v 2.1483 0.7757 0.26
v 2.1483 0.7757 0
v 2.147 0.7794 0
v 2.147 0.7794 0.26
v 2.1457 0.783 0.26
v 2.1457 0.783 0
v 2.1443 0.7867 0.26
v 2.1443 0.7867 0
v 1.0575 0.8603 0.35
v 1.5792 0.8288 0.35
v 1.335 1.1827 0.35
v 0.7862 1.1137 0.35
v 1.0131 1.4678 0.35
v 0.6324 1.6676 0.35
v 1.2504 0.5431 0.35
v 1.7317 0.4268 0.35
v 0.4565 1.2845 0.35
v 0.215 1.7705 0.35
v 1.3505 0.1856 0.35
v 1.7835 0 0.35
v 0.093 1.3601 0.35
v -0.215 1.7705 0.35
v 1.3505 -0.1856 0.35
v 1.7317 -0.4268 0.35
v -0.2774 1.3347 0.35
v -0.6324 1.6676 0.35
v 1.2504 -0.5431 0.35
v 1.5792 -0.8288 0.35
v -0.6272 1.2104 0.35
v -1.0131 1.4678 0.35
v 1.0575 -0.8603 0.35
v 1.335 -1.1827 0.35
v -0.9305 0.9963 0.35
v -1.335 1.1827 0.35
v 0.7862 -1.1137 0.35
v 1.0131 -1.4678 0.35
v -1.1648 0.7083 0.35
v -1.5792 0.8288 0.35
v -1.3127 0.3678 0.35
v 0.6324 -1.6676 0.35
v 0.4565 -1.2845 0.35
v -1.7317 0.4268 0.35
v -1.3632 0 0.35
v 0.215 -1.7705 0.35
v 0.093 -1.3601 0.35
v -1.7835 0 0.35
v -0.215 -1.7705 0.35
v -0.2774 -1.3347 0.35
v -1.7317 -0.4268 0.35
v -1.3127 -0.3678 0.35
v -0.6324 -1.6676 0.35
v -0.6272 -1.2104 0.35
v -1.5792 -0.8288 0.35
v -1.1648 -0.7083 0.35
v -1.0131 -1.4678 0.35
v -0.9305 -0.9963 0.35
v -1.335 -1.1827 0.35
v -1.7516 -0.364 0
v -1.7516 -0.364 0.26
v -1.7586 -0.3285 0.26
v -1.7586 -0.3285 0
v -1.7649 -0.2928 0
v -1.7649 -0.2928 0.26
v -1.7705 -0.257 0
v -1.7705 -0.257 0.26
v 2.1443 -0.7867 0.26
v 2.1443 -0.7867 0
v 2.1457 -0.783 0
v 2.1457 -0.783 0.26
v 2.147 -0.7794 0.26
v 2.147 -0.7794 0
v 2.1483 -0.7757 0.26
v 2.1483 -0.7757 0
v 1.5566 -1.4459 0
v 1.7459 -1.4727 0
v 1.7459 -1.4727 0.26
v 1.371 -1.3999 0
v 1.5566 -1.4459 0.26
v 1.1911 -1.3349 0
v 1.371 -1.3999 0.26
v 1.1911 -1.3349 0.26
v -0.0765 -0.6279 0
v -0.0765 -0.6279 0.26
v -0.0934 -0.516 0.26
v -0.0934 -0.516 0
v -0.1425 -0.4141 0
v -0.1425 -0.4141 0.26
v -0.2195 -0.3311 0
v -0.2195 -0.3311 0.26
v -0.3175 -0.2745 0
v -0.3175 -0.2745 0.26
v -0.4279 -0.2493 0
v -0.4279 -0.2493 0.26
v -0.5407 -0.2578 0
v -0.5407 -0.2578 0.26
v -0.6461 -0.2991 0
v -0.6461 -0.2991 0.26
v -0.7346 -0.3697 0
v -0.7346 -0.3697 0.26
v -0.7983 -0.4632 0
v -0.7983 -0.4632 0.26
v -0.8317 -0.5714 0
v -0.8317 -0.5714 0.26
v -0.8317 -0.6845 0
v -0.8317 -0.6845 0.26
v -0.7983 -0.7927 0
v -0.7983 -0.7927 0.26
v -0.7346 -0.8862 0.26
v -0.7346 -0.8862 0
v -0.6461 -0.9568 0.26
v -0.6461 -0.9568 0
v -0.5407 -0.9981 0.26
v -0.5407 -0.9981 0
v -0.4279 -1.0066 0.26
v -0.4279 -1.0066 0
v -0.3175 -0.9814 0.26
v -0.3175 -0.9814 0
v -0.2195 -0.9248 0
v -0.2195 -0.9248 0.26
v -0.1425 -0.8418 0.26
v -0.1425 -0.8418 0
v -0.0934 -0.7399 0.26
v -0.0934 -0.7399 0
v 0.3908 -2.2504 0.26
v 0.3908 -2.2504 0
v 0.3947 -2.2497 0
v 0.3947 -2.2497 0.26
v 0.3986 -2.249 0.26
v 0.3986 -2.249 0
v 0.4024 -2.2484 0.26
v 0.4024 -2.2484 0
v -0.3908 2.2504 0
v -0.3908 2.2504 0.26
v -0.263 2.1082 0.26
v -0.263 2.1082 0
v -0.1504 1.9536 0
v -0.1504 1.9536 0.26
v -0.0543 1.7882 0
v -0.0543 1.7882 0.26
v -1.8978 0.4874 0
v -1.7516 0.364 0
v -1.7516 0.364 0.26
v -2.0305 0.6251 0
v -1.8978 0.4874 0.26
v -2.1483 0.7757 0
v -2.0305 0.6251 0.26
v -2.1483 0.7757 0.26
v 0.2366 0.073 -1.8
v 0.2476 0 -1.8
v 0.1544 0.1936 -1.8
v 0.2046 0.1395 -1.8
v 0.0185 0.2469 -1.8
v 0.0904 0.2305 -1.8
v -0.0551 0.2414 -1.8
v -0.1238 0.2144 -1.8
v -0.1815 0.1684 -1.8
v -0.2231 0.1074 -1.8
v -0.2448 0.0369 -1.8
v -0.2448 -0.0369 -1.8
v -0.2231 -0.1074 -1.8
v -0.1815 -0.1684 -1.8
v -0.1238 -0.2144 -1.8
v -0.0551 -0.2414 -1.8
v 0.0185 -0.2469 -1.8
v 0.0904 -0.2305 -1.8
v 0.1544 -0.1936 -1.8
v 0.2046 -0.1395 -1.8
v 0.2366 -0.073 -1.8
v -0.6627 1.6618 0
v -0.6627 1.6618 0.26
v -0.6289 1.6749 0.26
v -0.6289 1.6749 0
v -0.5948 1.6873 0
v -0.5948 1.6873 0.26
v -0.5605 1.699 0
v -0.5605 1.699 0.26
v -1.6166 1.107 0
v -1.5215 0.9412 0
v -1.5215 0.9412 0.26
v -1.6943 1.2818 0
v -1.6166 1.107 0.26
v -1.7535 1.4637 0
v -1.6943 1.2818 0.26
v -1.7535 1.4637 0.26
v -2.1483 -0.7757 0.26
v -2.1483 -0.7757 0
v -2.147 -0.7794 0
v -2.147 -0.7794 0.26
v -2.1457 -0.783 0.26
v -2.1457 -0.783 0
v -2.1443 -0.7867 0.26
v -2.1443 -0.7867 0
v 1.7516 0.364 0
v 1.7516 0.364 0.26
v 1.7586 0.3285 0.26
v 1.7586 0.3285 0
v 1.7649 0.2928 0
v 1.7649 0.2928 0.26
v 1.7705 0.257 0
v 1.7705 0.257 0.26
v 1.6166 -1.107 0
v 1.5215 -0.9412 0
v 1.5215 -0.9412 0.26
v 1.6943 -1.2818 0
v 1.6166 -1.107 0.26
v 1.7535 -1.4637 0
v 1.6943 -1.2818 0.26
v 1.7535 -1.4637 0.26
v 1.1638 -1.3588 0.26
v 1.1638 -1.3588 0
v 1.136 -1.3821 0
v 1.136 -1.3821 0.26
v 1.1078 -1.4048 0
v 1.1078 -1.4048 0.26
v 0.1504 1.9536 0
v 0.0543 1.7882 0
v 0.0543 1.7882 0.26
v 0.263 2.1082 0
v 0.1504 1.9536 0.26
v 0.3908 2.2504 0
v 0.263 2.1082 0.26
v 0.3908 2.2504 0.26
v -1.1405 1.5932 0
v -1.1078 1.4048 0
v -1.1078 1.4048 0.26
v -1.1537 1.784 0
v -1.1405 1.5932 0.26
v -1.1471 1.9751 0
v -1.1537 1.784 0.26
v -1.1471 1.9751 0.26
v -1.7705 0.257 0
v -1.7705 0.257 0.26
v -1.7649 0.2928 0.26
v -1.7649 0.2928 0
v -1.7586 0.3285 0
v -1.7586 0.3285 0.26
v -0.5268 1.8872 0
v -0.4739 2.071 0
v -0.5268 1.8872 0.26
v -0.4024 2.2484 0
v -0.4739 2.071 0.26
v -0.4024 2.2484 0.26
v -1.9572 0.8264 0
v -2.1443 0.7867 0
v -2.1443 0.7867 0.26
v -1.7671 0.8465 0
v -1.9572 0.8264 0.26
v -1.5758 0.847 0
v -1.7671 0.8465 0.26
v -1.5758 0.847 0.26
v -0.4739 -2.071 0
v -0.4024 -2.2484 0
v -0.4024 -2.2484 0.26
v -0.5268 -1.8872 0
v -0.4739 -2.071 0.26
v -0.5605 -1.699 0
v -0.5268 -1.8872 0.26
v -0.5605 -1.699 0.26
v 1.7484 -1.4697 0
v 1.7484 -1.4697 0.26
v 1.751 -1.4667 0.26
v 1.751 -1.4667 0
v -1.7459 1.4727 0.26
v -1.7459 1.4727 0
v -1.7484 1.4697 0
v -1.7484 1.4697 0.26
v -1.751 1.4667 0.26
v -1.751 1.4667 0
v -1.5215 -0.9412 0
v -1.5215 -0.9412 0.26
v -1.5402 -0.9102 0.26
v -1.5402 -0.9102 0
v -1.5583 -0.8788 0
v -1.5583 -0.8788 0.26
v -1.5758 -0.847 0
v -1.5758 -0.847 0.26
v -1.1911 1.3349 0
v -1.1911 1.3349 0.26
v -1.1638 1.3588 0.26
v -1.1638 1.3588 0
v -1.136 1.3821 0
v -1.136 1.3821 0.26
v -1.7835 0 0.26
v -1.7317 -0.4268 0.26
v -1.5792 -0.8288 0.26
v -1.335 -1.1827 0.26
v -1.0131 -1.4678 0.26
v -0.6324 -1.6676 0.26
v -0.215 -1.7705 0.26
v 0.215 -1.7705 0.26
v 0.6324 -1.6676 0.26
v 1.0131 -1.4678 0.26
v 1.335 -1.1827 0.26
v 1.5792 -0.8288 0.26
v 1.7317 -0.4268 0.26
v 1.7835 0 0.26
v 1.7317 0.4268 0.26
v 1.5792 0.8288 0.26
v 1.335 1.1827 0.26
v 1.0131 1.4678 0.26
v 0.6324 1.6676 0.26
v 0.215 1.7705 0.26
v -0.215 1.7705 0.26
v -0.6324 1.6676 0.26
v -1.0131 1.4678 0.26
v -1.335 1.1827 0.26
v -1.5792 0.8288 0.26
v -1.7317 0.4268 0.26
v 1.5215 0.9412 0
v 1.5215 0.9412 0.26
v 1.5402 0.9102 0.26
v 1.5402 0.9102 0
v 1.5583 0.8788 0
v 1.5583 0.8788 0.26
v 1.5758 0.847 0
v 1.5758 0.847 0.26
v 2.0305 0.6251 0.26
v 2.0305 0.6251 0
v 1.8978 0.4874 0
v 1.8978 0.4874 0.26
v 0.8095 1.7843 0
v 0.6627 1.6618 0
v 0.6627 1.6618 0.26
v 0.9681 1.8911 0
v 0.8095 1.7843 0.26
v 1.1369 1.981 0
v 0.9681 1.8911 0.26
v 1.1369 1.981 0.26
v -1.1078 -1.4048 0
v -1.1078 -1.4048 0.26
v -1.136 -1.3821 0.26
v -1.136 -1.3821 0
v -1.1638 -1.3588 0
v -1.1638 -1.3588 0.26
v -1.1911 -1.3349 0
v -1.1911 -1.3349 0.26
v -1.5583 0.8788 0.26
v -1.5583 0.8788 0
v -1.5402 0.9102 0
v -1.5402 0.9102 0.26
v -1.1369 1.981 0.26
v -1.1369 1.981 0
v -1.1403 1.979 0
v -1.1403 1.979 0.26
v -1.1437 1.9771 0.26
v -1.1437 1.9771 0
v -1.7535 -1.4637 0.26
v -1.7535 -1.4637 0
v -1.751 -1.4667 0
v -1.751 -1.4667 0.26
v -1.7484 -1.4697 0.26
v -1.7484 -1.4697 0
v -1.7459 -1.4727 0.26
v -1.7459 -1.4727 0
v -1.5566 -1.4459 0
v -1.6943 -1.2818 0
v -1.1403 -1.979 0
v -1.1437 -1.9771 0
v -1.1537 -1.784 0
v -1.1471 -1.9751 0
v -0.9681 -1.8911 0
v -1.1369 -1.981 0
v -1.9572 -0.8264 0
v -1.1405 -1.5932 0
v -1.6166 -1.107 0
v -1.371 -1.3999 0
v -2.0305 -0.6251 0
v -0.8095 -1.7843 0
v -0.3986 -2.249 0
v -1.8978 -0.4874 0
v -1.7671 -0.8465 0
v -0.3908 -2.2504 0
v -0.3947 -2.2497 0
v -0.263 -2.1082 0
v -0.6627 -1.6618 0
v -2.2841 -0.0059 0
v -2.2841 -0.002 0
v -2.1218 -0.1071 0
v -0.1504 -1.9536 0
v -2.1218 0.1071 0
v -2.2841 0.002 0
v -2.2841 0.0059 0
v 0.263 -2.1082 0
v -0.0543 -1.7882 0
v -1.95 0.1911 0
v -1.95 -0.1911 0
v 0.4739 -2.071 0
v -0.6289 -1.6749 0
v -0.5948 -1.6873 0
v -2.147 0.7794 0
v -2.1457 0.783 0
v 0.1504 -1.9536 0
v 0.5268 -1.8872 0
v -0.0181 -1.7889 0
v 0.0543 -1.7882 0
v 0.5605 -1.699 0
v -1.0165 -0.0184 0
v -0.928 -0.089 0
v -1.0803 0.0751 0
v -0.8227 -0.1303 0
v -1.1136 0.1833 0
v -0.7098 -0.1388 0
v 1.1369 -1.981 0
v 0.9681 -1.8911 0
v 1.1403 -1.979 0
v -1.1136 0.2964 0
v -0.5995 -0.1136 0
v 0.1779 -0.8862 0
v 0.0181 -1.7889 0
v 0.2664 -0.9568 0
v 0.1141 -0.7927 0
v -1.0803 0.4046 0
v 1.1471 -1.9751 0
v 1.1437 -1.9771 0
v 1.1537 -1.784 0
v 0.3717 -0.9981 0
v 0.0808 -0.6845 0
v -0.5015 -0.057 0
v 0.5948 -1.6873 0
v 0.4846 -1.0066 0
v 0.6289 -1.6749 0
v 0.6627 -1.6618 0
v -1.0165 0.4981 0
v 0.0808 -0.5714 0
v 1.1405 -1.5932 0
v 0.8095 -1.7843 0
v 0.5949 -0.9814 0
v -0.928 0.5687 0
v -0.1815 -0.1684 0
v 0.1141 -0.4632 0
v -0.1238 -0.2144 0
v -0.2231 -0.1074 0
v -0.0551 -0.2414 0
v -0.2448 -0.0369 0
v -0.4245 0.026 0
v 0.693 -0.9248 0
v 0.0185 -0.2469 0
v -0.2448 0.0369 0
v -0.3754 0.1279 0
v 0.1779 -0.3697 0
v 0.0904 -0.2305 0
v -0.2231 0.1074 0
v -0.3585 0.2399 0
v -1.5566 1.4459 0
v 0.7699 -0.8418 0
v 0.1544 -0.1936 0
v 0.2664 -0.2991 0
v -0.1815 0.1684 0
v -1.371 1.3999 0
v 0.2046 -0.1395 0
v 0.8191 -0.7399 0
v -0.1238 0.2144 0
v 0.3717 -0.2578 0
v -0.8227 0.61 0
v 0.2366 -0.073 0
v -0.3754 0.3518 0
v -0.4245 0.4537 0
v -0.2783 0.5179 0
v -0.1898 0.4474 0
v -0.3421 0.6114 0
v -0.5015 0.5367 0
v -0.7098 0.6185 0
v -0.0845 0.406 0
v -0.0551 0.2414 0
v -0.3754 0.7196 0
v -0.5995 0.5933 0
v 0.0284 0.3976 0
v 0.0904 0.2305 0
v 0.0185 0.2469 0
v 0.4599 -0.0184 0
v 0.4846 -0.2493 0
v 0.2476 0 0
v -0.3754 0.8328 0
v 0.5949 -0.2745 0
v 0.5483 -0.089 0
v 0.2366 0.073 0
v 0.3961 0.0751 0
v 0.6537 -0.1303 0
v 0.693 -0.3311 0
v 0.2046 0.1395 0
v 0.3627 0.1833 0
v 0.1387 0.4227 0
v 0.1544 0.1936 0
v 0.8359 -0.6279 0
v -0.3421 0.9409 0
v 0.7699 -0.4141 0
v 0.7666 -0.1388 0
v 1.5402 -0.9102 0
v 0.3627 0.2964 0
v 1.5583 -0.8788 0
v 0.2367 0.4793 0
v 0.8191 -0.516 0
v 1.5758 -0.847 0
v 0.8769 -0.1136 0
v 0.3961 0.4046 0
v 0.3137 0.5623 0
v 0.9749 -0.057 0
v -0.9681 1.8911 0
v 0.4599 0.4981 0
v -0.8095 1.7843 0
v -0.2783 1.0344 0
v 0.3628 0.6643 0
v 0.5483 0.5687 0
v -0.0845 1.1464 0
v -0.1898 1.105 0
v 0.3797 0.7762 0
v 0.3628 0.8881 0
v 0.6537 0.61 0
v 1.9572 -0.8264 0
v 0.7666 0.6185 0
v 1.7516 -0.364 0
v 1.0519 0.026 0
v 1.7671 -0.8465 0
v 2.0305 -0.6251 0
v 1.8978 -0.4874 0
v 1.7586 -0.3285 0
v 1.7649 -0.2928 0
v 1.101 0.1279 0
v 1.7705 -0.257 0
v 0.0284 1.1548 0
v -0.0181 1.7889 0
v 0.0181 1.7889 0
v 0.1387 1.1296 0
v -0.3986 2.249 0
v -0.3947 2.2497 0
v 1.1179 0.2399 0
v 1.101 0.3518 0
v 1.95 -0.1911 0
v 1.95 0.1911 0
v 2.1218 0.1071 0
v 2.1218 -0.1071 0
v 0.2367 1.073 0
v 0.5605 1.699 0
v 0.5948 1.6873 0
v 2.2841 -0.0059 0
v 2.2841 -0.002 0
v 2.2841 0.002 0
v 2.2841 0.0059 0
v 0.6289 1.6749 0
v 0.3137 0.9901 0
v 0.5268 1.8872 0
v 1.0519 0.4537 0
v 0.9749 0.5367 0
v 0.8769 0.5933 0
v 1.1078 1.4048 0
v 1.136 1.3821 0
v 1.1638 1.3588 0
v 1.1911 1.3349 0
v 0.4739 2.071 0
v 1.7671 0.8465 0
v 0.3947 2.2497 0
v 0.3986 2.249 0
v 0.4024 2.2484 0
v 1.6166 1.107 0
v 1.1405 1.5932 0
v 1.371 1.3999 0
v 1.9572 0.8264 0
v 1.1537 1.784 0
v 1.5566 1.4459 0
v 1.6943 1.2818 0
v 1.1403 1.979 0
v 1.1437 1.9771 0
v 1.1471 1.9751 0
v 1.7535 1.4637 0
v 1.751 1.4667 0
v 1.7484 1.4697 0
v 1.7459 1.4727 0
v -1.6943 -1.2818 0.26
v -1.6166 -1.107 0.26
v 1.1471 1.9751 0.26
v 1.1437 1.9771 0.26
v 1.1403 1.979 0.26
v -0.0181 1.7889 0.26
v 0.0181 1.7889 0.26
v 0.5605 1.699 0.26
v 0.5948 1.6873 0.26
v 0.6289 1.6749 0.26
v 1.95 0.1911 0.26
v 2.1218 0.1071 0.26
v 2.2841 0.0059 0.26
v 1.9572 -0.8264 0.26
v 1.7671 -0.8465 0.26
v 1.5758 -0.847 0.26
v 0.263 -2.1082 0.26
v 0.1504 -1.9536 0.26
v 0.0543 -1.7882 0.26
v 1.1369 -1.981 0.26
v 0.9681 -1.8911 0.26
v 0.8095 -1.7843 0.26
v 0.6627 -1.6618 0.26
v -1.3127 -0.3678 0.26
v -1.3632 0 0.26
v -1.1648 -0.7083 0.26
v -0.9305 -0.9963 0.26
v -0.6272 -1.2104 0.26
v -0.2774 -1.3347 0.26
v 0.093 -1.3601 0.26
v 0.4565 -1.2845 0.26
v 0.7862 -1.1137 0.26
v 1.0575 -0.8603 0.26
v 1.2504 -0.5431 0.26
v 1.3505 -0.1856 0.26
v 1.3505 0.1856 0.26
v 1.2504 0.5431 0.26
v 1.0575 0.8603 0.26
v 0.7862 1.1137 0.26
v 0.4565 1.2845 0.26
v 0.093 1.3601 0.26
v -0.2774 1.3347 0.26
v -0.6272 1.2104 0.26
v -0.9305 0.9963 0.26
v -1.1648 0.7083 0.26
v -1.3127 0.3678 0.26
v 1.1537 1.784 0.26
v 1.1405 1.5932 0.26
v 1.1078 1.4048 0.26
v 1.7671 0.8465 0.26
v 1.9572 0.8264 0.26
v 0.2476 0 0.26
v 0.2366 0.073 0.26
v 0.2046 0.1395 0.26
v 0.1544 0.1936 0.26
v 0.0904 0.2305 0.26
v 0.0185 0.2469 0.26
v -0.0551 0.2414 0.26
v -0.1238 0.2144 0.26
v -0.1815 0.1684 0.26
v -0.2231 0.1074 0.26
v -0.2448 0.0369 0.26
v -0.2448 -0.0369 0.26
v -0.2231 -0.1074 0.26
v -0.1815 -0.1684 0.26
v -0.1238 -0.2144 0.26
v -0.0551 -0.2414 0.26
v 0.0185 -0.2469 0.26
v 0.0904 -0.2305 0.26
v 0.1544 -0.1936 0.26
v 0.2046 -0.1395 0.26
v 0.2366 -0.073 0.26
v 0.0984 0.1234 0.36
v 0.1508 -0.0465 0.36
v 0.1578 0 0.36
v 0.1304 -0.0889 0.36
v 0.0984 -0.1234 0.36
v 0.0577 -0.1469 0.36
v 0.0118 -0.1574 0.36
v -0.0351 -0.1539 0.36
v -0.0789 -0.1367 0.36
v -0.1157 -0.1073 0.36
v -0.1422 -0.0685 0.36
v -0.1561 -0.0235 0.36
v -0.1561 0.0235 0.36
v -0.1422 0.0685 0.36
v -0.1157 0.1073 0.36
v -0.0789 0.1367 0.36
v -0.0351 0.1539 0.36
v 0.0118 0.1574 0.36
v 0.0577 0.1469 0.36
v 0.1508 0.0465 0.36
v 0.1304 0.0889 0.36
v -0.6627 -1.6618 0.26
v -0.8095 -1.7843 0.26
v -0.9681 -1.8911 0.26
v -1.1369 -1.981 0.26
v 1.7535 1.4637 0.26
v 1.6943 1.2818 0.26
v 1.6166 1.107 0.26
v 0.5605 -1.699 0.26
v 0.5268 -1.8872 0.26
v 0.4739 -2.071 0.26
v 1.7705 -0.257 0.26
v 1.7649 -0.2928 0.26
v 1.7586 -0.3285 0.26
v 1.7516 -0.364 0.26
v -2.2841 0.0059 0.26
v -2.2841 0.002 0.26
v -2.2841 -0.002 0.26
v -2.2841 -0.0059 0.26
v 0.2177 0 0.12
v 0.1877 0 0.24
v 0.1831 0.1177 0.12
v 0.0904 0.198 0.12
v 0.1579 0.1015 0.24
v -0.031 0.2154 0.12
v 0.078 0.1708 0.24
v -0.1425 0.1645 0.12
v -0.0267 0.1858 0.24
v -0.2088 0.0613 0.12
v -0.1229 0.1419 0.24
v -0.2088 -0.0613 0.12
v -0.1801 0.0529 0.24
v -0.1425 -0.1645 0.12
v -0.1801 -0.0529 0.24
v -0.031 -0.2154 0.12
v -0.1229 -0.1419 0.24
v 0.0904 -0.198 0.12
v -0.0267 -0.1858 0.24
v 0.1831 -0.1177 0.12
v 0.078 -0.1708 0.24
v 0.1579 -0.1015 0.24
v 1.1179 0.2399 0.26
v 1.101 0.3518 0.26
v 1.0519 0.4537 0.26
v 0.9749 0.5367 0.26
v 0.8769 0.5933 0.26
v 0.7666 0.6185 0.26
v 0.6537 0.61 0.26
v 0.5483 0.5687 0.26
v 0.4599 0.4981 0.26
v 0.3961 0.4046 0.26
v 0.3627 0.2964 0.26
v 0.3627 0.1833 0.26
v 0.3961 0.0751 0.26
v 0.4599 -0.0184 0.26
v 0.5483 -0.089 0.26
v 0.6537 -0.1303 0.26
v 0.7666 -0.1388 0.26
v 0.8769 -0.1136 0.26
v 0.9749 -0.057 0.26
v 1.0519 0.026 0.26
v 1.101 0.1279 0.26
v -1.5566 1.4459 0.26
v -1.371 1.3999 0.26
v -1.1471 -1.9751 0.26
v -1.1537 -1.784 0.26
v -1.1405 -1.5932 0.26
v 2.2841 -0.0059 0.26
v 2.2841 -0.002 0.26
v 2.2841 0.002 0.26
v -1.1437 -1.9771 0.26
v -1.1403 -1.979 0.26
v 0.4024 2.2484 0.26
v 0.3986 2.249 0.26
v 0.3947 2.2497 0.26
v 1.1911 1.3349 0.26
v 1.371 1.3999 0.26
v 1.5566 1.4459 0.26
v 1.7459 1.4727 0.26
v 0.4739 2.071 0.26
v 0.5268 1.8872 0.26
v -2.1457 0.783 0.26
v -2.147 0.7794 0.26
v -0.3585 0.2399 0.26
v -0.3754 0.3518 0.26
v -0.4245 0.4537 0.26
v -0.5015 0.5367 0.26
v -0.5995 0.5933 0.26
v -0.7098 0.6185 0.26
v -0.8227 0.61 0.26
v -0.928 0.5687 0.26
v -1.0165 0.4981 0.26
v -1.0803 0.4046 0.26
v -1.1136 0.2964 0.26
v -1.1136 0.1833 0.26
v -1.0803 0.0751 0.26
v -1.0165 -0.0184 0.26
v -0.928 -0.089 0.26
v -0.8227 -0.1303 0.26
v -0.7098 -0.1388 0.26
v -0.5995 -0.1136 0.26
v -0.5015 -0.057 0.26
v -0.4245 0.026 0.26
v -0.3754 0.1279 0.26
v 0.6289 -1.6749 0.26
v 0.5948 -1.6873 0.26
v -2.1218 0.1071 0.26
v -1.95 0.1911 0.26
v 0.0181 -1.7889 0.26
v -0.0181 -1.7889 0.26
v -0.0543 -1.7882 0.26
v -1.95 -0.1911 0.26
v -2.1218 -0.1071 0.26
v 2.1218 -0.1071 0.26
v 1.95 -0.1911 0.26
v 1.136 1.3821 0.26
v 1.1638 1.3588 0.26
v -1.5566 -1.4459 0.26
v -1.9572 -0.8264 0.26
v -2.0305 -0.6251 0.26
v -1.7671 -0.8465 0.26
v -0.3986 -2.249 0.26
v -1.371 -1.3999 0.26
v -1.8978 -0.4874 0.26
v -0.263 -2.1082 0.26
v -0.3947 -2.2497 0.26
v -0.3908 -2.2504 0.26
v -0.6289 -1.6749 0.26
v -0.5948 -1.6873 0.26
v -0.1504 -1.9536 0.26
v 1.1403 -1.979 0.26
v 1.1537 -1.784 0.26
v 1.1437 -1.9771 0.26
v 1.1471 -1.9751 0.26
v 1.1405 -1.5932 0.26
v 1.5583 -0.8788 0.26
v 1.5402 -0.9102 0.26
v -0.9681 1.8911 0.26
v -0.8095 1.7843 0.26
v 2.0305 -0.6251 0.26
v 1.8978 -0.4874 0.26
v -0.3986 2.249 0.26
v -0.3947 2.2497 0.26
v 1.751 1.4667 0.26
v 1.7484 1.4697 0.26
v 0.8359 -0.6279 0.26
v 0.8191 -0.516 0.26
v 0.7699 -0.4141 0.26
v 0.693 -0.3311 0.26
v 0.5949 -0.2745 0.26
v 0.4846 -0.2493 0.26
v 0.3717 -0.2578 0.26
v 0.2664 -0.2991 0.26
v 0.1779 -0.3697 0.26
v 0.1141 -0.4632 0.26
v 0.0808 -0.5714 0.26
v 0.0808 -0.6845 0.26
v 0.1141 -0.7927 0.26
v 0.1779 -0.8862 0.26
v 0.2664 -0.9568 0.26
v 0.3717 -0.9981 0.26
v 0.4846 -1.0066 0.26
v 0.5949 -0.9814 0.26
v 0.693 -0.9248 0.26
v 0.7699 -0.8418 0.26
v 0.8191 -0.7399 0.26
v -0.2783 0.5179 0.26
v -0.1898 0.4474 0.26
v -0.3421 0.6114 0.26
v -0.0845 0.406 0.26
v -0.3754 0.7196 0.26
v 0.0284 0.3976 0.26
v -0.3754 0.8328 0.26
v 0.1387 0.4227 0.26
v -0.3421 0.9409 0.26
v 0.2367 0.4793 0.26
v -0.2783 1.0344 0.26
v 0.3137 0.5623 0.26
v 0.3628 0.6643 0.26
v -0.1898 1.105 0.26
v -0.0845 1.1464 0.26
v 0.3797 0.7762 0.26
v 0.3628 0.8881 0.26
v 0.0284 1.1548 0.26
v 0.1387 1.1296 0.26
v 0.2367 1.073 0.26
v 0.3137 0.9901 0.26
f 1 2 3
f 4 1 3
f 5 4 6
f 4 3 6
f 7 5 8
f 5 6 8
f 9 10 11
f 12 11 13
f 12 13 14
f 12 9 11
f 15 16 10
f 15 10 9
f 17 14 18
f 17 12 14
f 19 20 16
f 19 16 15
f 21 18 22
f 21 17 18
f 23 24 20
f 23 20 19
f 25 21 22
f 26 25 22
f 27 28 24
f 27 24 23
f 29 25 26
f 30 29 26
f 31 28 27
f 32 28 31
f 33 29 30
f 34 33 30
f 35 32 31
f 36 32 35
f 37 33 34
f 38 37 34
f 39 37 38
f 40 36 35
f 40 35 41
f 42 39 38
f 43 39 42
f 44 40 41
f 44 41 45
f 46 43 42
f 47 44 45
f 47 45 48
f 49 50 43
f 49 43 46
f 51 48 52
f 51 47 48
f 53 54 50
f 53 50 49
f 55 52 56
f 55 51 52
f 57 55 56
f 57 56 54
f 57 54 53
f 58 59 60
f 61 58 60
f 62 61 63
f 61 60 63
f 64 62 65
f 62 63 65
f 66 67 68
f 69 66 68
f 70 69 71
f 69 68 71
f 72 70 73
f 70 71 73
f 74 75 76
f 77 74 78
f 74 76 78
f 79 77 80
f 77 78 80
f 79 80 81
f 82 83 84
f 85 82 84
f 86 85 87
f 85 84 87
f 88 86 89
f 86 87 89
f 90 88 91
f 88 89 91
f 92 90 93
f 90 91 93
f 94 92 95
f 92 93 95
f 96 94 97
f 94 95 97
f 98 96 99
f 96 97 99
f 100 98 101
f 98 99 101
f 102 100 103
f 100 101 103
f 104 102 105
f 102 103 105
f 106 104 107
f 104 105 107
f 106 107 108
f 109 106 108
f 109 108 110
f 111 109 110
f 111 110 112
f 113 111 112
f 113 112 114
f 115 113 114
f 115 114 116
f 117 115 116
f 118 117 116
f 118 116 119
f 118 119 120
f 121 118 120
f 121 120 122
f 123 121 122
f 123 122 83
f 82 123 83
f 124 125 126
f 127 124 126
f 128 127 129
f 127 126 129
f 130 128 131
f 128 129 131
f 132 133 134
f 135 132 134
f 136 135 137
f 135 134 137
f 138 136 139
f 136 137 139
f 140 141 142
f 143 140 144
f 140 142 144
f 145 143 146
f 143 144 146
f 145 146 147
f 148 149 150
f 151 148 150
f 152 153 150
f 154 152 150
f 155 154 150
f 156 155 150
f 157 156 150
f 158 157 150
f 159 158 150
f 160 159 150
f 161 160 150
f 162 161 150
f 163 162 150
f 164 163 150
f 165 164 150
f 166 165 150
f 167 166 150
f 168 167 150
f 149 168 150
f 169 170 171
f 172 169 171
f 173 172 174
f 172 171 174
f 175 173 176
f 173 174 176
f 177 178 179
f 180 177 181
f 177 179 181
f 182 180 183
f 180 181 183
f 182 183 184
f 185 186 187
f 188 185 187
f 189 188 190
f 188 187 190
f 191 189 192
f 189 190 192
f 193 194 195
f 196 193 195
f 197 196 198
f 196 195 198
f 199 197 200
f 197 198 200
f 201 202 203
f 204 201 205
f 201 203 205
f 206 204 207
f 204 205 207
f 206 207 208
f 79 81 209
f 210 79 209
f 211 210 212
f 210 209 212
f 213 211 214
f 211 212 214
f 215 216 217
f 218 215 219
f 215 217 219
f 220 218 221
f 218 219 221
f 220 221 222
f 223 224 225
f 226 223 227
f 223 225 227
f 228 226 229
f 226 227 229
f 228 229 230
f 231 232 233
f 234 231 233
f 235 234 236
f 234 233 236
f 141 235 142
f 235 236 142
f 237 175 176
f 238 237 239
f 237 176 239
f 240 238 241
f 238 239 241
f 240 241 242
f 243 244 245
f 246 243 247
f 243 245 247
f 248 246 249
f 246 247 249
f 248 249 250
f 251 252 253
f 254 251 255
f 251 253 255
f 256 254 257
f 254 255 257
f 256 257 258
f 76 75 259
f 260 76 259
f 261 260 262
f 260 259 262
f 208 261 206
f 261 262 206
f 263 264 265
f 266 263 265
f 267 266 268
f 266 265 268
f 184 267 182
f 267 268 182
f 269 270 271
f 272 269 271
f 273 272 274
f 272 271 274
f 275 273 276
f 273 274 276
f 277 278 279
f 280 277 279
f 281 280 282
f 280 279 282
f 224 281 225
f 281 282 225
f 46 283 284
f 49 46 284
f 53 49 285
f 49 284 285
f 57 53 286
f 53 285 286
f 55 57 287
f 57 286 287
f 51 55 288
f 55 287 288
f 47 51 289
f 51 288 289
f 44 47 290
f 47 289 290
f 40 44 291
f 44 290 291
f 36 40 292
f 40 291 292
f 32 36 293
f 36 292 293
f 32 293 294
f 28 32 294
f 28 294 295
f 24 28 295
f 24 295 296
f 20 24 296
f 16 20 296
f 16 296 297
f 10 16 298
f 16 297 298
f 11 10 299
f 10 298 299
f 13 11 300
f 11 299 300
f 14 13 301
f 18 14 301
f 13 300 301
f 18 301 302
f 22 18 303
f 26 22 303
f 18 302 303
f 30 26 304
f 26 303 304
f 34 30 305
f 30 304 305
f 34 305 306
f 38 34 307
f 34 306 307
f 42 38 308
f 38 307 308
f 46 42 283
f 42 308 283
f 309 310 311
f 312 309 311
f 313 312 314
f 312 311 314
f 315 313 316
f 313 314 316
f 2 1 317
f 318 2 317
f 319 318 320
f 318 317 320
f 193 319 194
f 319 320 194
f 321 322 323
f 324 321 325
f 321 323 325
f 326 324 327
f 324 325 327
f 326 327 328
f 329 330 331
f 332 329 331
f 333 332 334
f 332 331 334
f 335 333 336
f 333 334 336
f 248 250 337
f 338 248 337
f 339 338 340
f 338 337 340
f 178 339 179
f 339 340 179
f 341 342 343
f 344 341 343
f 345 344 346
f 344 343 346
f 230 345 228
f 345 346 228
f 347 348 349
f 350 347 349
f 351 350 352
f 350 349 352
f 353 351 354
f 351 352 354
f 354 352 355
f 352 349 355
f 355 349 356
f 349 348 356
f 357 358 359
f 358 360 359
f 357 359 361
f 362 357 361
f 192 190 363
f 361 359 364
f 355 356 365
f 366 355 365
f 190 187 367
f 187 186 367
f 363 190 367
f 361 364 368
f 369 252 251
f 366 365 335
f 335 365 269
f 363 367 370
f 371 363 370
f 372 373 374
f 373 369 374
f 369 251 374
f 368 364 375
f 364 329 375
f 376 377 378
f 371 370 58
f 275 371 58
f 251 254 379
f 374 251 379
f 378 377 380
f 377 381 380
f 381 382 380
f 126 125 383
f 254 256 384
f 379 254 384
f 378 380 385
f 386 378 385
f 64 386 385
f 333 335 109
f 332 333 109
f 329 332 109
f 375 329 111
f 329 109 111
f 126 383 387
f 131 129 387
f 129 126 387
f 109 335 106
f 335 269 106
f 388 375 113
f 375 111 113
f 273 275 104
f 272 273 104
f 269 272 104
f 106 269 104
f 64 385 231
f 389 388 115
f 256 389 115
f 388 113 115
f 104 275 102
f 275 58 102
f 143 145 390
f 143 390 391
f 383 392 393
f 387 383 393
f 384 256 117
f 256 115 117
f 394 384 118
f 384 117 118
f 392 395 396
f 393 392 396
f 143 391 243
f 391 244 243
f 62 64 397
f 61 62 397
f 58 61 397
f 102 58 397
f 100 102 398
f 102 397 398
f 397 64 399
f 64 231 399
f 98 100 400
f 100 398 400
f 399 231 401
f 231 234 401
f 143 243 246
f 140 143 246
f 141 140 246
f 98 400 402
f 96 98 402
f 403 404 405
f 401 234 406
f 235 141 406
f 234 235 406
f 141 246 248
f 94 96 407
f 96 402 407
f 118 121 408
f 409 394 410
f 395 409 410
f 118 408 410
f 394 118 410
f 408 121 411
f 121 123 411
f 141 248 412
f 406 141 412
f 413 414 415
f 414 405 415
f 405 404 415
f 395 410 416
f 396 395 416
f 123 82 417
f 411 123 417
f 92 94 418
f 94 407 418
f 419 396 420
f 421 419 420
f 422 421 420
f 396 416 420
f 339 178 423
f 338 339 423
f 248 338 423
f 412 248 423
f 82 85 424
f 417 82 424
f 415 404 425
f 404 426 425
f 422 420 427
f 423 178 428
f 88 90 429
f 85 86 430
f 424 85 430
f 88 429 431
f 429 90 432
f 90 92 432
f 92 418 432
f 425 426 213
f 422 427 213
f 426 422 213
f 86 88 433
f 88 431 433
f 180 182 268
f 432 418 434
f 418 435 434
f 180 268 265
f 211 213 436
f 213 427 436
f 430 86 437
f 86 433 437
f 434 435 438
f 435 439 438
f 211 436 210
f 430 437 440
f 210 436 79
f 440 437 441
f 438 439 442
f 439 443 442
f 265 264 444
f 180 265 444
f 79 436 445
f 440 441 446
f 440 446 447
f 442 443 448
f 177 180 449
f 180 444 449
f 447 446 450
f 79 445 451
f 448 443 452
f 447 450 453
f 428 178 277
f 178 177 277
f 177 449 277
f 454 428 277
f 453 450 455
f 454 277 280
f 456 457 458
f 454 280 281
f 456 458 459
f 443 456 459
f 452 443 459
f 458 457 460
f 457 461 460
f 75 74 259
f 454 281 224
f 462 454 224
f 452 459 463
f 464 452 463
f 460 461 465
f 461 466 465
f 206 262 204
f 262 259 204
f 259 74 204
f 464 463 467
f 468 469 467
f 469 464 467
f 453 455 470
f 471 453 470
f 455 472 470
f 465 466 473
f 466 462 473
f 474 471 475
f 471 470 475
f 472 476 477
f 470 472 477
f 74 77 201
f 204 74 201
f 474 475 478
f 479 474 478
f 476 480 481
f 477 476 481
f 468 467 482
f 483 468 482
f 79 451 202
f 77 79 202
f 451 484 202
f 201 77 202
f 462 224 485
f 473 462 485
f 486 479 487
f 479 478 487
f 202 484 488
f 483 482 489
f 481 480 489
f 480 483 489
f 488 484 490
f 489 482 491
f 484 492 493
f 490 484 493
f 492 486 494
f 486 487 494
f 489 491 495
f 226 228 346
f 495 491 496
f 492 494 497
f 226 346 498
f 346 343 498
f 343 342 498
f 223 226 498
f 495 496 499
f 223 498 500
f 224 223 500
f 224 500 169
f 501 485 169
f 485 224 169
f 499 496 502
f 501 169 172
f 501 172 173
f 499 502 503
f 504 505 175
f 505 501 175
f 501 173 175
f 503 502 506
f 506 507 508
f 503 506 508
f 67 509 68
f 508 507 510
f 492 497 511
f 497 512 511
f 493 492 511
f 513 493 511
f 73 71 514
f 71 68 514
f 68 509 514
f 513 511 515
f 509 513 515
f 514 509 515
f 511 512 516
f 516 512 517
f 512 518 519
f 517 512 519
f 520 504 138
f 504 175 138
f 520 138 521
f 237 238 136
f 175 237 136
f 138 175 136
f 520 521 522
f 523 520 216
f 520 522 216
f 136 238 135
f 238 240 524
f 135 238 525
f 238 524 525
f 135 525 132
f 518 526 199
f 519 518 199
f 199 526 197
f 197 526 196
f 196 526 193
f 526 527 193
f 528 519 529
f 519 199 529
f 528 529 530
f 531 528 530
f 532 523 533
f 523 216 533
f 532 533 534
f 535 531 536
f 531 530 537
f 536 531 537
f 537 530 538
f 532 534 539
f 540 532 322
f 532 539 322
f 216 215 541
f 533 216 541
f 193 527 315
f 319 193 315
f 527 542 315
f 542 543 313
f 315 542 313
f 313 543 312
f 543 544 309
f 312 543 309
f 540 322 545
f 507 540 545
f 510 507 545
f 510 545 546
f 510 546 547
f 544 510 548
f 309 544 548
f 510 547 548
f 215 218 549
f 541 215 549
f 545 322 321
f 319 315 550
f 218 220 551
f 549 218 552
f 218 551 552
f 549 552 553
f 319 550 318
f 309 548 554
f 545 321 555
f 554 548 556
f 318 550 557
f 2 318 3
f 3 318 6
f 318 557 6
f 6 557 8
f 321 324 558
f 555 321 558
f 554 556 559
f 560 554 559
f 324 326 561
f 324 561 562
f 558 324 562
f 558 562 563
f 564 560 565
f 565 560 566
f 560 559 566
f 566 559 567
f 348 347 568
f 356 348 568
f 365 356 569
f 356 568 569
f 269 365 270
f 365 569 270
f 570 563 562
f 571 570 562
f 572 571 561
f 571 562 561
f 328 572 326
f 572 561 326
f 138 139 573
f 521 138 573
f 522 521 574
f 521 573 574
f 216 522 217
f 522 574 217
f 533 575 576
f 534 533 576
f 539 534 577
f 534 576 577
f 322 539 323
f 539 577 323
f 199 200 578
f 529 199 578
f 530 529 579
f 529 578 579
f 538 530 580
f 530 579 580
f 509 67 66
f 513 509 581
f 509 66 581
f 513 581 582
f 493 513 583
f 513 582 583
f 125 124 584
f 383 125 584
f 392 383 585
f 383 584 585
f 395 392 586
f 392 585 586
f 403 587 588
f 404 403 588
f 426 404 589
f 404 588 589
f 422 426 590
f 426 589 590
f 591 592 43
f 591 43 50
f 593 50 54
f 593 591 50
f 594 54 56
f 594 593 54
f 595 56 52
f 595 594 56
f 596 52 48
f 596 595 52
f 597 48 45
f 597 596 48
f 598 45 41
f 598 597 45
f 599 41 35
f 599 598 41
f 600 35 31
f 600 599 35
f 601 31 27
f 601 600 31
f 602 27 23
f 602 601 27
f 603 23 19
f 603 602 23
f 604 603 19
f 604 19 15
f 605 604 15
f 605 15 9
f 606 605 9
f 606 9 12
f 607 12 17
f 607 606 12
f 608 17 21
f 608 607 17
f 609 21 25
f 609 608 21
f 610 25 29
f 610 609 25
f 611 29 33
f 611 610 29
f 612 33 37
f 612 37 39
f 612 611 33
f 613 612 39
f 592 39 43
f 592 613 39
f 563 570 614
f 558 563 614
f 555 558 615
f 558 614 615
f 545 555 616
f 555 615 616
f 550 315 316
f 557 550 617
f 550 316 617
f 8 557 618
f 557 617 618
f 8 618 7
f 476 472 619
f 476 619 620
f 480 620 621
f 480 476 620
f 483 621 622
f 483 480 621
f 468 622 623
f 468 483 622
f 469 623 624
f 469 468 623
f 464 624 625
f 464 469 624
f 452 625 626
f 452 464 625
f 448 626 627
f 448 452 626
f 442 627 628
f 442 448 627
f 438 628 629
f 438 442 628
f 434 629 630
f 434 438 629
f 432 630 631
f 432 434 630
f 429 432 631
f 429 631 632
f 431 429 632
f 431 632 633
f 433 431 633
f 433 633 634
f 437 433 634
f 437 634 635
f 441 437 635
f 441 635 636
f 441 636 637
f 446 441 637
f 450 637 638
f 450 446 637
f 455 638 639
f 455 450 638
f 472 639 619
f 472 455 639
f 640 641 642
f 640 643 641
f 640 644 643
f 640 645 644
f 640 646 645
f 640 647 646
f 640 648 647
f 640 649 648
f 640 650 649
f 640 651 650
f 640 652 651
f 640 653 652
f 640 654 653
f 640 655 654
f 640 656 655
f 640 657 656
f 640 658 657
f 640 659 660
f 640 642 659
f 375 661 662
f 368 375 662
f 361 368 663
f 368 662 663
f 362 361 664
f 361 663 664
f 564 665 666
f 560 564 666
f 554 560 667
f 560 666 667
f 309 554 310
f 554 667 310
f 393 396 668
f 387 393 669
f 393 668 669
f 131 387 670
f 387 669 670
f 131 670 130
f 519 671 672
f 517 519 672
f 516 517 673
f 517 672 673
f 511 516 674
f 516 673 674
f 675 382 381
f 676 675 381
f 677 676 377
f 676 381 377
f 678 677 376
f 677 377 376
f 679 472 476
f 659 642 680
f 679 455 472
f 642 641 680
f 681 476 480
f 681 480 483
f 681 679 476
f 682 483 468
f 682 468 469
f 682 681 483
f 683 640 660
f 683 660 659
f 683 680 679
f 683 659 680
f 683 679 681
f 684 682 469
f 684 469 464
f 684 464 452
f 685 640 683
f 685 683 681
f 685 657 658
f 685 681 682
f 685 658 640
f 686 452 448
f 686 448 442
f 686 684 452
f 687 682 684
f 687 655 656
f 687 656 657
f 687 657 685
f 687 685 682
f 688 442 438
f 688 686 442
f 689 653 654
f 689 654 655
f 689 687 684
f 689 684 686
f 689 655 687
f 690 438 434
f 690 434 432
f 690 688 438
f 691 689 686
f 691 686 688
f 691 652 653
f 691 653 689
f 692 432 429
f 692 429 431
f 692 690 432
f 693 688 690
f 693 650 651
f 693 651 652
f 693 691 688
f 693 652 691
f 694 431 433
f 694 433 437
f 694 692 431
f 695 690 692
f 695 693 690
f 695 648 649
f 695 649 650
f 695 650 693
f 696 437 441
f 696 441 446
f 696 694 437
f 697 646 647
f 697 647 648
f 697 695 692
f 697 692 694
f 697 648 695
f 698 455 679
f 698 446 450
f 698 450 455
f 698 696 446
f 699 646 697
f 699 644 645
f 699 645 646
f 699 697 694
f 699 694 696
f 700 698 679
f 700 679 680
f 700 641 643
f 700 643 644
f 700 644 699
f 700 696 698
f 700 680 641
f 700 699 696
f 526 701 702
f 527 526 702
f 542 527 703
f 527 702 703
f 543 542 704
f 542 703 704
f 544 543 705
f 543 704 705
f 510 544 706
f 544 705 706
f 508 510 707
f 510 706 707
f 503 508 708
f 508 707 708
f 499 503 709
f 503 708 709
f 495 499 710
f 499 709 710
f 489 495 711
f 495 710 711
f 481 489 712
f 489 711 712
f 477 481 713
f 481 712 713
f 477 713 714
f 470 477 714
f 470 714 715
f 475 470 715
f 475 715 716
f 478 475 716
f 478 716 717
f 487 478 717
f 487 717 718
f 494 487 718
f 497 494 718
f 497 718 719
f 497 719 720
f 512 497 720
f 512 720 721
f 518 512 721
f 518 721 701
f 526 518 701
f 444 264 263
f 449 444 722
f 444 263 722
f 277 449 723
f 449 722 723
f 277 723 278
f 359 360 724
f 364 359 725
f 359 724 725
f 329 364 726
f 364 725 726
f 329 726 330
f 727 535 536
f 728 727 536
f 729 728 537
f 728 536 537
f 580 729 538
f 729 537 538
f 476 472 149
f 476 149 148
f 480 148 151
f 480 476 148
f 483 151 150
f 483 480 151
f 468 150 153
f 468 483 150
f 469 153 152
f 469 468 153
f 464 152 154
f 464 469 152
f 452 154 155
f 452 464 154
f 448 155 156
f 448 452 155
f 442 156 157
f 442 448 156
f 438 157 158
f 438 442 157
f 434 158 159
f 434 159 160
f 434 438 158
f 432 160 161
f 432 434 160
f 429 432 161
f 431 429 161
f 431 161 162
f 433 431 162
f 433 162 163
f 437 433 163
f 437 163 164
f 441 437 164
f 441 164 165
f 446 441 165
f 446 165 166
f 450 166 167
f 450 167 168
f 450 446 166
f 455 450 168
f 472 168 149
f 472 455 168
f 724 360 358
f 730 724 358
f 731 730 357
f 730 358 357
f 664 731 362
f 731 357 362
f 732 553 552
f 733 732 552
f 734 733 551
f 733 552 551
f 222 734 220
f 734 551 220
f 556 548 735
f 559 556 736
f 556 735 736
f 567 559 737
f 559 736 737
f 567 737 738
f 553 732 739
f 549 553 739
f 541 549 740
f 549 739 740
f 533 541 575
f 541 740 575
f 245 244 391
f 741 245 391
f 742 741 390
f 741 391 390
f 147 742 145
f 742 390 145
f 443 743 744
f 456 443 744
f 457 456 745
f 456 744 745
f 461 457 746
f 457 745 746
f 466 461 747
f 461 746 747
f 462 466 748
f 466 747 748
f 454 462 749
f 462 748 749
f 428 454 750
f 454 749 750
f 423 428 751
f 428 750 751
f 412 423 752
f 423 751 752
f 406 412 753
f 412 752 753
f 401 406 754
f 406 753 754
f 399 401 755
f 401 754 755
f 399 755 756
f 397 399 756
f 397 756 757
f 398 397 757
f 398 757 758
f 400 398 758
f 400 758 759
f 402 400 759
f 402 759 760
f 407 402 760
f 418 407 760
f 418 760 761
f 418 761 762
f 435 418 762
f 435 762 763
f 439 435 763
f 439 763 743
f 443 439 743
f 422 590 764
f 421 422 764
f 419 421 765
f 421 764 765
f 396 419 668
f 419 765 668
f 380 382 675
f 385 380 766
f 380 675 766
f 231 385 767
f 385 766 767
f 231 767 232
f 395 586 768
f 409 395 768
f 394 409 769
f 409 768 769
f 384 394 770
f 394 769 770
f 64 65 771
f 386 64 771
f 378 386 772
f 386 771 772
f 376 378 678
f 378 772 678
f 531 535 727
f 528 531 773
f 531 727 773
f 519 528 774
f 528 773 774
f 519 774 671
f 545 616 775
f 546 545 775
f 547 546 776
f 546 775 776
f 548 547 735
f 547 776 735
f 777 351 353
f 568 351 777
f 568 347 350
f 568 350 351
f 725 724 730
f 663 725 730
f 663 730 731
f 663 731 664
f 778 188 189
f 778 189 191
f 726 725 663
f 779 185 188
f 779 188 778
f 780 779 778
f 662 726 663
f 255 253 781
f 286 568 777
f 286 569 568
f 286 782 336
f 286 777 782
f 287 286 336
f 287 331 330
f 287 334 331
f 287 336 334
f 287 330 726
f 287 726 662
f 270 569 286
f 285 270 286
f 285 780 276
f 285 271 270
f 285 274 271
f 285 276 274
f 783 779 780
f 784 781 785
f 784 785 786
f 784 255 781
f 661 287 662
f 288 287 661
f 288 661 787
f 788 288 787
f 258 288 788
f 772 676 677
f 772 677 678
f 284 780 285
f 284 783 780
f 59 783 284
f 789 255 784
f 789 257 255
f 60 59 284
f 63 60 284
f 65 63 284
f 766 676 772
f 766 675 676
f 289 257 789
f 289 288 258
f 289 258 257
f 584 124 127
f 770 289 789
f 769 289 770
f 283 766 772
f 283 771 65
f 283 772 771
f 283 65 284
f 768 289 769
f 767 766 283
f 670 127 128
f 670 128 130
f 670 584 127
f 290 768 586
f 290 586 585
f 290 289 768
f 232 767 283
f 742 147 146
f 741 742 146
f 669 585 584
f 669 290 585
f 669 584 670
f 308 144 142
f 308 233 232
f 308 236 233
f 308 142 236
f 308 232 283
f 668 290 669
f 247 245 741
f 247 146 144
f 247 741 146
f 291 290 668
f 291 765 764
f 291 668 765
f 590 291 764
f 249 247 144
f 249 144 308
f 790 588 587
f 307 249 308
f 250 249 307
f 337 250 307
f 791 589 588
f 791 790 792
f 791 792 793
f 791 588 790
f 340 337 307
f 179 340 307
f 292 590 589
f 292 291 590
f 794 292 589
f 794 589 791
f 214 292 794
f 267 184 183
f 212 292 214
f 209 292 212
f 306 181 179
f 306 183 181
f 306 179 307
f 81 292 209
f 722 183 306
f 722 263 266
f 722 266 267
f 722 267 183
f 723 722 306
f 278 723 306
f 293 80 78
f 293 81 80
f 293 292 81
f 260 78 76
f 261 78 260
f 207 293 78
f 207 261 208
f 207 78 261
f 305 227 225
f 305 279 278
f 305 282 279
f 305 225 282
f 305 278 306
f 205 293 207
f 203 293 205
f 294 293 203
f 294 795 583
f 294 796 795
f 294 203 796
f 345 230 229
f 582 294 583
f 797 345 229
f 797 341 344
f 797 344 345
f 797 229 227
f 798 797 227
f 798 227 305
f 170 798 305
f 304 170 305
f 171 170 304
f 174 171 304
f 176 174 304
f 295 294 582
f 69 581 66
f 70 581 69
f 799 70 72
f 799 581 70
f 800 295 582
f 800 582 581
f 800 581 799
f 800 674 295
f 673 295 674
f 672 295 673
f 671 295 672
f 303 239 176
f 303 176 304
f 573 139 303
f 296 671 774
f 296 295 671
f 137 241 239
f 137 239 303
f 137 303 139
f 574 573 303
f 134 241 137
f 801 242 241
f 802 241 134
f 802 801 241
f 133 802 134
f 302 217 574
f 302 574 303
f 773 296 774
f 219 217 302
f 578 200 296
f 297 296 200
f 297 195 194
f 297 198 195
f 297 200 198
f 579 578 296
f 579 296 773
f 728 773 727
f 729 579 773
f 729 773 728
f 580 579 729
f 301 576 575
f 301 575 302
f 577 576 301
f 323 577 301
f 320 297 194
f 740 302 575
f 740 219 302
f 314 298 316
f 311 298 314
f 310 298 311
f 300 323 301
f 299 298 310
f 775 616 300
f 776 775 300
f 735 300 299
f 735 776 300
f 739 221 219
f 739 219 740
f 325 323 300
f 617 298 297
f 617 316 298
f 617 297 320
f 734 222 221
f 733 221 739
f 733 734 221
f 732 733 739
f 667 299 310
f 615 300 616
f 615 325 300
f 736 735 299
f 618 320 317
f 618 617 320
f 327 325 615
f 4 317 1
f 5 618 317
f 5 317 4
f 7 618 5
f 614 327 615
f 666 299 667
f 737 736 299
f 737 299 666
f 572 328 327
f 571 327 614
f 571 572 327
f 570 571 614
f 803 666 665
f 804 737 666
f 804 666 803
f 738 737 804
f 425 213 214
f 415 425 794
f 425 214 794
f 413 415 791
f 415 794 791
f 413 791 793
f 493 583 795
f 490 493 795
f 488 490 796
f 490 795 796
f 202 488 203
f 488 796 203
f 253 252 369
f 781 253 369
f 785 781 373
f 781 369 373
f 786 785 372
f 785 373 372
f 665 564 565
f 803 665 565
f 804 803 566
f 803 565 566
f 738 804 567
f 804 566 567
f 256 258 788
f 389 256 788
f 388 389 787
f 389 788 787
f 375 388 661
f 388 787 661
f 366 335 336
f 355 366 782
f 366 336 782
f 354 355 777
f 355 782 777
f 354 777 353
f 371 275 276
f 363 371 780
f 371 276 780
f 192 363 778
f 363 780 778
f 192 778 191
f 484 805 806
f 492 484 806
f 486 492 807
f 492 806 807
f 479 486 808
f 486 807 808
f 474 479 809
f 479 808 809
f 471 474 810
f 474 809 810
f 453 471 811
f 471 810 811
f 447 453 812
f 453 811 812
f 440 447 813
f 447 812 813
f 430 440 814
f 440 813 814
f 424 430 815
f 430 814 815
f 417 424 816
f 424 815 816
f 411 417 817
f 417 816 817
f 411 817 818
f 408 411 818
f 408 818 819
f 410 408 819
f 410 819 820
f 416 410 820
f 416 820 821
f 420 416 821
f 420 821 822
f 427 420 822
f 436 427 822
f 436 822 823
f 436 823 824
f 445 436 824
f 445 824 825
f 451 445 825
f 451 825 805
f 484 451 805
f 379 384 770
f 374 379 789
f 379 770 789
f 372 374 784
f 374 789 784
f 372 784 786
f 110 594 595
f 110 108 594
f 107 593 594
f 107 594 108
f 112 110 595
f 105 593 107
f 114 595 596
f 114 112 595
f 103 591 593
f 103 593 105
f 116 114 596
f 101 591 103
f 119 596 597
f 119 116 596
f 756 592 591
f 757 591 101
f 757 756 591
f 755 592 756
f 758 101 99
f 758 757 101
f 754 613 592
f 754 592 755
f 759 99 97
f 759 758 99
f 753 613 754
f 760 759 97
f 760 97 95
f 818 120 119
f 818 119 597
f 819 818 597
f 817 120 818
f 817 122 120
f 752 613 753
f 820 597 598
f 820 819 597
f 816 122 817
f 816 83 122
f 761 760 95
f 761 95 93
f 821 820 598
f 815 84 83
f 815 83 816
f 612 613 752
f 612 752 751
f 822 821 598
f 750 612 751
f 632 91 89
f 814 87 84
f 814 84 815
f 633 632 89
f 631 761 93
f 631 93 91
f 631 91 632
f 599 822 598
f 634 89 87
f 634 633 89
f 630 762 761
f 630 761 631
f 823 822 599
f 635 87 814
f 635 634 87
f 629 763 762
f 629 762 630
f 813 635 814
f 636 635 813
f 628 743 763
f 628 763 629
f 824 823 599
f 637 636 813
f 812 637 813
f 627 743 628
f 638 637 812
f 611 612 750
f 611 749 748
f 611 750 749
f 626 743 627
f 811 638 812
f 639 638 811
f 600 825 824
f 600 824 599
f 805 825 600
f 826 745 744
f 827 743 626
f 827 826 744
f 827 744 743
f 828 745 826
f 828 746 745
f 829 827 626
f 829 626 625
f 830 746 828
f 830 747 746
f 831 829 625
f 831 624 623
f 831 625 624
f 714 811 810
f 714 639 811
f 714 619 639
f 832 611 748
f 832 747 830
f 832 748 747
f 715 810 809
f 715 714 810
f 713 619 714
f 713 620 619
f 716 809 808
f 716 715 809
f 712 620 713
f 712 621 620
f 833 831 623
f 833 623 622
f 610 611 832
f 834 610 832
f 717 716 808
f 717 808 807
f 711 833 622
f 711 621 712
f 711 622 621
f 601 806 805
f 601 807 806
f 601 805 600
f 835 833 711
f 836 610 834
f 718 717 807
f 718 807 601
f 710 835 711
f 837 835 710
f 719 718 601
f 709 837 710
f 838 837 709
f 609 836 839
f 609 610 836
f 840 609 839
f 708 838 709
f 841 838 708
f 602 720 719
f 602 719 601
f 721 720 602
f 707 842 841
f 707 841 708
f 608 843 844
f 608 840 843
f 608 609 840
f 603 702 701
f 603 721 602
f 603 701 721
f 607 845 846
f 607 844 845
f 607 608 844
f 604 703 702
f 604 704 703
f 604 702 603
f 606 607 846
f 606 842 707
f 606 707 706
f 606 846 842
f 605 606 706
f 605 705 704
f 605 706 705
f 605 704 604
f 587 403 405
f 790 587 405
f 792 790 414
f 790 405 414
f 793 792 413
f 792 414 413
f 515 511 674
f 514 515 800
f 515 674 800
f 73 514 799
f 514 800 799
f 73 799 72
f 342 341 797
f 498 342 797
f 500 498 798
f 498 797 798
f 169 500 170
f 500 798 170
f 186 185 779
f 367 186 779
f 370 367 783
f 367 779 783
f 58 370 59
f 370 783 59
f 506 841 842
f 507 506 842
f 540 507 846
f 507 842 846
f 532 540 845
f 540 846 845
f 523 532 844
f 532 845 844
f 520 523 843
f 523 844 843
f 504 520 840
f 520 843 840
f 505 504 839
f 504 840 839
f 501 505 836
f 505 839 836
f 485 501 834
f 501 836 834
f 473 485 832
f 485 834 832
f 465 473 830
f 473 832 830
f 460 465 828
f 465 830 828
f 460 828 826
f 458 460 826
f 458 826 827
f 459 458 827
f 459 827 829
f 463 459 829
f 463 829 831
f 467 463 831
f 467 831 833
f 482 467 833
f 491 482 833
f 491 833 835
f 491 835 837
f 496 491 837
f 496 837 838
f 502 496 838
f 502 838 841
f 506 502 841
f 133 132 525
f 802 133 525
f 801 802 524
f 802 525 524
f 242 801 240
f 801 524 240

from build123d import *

# Parameters (mm, degrees)
ESQUISSE1_R                  = 2.284078073
ESQUISSE1_R_2                = 0.247571695
BOSS_EXTRU_1_DEPTH           = 0.26
ESQUISSE1_2_R                = 0.247571695
BOSS_EXTRU_2_DEPTH           = 0.36
BOSS_EXTRU_2_TAPER           = 14
BOSS_EXTRU_2_OTHER_WAY_DEPTH = 1.8
ENL_V_MAT_EXTRU_2_DEPTH      = 0.3
R_P_TITION_CIRCULAIRE2_COUNT = 18
ESQUISSE6_R                  = 1.783481367
ESQUISSE6_R_2                = 1.363245537
BOSS_EXTRU_4_DEPTH           = 0.09
ESQUISSE7_R                  = 0.379690264
ENL_V_MAT_EXTRU_3_DEPTH      = 0.29


with BuildPart() as part:
    # Esquisse1 → Boss.-Extru.1 (new body)
    with BuildSketch(Plane.XY):
        Circle(ESQUISSE1_R)
        Circle(ESQUISSE1_R_2, mode=Mode.SUBTRACT)
    extrude(amount=BOSS_EXTRU_1_DEPTH)



with BuildPart() as body_2:
    # Esquisse1<2> → Boss.-Extru.2 (new body)
    with BuildSketch(Plane.XY):
        Circle(ESQUISSE1_2_R)
    extrude(amount=BOSS_EXTRU_2_DEPTH, taper=BOSS_EXTRU_2_TAPER)


with BuildPart() as part_1:
    add(part.part)

    add(body_2.part)  # Boss.-Extru.2 other way merges body 2
    # Esquisse1<2> → Boss.-Extru.2 other way (add)
    with BuildSketch(Plane.XY):
        Circle(ESQUISSE1_2_R)
    extrude(amount=-BOSS_EXTRU_2_OTHER_WAY_DEPTH)

    # Esquisse5 → Enlèv. mat.-Extru.2 (cut)
    with BuildSketch(Plane.XY.offset(0.26)):
        with BuildLine():
            ThreePointArc((0.545916178, 2.389371867), (0, 2.450943164), (-0.545916178, 2.389371867))
            ThreePointArc((-0.545916178, 2.389371867), (-0.268336451, 2.114789396), (-0.054345927, 1.788210011))
            ThreePointArc((-0.054345927, 1.788210011), (0, 1.789035641), (0.054345927, 1.788210011))
            ThreePointArc((0.054345927, 1.788210011), (0.268336451, 2.114789396), (0.545916178, 2.389371867))
        make_face()
    enl_v_mat_extru_2 = extrude(amount=-ENL_V_MAT_EXTRU_2_DEPTH, mode=Mode.SUBTRACT)

    # Répétition circulaire2: Enlèv. mat.-Extru.2 ×18 about axis
    r_p_tition_circulaire2_axis = Axis((0, 0, 0), (0, 0, 1))
    for i in range(1, R_P_TITION_CIRCULAIRE2_COUNT):
        add(enl_v_mat_extru_2.rotate(r_p_tition_circulaire2_axis, i * 360 / R_P_TITION_CIRCULAIRE2_COUNT), mode=Mode.SUBTRACT)

    # Esquisse6 → Boss.-Extru.4 (add)
    with BuildSketch(Plane.XY.offset(0.26)):
        with Locations(Location((0, 0, 0), (0, 0, 180))):
            Circle(ESQUISSE6_R)
        with Locations(Location((0, 0, 0), (0, 0, 180))):
            Circle(ESQUISSE6_R_2, mode=Mode.SUBTRACT)
    extrude(amount=BOSS_EXTRU_4_DEPTH)

    # Esquisse7 → Enlèv. mat.-Extru.3 (cut)
    with BuildSketch(Plane.XY.offset(0.26)):
        with Locations((0, 0.776183942)):
            Circle(ESQUISSE7_R)
        with Locations((0.738194796, 0.239854029)):
            Circle(ESQUISSE7_R)
        with Locations((0.456229474, -0.627946)):
            Circle(ESQUISSE7_R)
        with Locations((-0.456229474, -0.627946)):
            Circle(ESQUISSE7_R)
        with Locations((-0.738194796, 0.239854029)):
            Circle(ESQUISSE7_R)
    extrude(amount=-ENL_V_MAT_EXTRU_3_DEPTH, mode=Mode.SUBTRACT)


solid = part_1.part
